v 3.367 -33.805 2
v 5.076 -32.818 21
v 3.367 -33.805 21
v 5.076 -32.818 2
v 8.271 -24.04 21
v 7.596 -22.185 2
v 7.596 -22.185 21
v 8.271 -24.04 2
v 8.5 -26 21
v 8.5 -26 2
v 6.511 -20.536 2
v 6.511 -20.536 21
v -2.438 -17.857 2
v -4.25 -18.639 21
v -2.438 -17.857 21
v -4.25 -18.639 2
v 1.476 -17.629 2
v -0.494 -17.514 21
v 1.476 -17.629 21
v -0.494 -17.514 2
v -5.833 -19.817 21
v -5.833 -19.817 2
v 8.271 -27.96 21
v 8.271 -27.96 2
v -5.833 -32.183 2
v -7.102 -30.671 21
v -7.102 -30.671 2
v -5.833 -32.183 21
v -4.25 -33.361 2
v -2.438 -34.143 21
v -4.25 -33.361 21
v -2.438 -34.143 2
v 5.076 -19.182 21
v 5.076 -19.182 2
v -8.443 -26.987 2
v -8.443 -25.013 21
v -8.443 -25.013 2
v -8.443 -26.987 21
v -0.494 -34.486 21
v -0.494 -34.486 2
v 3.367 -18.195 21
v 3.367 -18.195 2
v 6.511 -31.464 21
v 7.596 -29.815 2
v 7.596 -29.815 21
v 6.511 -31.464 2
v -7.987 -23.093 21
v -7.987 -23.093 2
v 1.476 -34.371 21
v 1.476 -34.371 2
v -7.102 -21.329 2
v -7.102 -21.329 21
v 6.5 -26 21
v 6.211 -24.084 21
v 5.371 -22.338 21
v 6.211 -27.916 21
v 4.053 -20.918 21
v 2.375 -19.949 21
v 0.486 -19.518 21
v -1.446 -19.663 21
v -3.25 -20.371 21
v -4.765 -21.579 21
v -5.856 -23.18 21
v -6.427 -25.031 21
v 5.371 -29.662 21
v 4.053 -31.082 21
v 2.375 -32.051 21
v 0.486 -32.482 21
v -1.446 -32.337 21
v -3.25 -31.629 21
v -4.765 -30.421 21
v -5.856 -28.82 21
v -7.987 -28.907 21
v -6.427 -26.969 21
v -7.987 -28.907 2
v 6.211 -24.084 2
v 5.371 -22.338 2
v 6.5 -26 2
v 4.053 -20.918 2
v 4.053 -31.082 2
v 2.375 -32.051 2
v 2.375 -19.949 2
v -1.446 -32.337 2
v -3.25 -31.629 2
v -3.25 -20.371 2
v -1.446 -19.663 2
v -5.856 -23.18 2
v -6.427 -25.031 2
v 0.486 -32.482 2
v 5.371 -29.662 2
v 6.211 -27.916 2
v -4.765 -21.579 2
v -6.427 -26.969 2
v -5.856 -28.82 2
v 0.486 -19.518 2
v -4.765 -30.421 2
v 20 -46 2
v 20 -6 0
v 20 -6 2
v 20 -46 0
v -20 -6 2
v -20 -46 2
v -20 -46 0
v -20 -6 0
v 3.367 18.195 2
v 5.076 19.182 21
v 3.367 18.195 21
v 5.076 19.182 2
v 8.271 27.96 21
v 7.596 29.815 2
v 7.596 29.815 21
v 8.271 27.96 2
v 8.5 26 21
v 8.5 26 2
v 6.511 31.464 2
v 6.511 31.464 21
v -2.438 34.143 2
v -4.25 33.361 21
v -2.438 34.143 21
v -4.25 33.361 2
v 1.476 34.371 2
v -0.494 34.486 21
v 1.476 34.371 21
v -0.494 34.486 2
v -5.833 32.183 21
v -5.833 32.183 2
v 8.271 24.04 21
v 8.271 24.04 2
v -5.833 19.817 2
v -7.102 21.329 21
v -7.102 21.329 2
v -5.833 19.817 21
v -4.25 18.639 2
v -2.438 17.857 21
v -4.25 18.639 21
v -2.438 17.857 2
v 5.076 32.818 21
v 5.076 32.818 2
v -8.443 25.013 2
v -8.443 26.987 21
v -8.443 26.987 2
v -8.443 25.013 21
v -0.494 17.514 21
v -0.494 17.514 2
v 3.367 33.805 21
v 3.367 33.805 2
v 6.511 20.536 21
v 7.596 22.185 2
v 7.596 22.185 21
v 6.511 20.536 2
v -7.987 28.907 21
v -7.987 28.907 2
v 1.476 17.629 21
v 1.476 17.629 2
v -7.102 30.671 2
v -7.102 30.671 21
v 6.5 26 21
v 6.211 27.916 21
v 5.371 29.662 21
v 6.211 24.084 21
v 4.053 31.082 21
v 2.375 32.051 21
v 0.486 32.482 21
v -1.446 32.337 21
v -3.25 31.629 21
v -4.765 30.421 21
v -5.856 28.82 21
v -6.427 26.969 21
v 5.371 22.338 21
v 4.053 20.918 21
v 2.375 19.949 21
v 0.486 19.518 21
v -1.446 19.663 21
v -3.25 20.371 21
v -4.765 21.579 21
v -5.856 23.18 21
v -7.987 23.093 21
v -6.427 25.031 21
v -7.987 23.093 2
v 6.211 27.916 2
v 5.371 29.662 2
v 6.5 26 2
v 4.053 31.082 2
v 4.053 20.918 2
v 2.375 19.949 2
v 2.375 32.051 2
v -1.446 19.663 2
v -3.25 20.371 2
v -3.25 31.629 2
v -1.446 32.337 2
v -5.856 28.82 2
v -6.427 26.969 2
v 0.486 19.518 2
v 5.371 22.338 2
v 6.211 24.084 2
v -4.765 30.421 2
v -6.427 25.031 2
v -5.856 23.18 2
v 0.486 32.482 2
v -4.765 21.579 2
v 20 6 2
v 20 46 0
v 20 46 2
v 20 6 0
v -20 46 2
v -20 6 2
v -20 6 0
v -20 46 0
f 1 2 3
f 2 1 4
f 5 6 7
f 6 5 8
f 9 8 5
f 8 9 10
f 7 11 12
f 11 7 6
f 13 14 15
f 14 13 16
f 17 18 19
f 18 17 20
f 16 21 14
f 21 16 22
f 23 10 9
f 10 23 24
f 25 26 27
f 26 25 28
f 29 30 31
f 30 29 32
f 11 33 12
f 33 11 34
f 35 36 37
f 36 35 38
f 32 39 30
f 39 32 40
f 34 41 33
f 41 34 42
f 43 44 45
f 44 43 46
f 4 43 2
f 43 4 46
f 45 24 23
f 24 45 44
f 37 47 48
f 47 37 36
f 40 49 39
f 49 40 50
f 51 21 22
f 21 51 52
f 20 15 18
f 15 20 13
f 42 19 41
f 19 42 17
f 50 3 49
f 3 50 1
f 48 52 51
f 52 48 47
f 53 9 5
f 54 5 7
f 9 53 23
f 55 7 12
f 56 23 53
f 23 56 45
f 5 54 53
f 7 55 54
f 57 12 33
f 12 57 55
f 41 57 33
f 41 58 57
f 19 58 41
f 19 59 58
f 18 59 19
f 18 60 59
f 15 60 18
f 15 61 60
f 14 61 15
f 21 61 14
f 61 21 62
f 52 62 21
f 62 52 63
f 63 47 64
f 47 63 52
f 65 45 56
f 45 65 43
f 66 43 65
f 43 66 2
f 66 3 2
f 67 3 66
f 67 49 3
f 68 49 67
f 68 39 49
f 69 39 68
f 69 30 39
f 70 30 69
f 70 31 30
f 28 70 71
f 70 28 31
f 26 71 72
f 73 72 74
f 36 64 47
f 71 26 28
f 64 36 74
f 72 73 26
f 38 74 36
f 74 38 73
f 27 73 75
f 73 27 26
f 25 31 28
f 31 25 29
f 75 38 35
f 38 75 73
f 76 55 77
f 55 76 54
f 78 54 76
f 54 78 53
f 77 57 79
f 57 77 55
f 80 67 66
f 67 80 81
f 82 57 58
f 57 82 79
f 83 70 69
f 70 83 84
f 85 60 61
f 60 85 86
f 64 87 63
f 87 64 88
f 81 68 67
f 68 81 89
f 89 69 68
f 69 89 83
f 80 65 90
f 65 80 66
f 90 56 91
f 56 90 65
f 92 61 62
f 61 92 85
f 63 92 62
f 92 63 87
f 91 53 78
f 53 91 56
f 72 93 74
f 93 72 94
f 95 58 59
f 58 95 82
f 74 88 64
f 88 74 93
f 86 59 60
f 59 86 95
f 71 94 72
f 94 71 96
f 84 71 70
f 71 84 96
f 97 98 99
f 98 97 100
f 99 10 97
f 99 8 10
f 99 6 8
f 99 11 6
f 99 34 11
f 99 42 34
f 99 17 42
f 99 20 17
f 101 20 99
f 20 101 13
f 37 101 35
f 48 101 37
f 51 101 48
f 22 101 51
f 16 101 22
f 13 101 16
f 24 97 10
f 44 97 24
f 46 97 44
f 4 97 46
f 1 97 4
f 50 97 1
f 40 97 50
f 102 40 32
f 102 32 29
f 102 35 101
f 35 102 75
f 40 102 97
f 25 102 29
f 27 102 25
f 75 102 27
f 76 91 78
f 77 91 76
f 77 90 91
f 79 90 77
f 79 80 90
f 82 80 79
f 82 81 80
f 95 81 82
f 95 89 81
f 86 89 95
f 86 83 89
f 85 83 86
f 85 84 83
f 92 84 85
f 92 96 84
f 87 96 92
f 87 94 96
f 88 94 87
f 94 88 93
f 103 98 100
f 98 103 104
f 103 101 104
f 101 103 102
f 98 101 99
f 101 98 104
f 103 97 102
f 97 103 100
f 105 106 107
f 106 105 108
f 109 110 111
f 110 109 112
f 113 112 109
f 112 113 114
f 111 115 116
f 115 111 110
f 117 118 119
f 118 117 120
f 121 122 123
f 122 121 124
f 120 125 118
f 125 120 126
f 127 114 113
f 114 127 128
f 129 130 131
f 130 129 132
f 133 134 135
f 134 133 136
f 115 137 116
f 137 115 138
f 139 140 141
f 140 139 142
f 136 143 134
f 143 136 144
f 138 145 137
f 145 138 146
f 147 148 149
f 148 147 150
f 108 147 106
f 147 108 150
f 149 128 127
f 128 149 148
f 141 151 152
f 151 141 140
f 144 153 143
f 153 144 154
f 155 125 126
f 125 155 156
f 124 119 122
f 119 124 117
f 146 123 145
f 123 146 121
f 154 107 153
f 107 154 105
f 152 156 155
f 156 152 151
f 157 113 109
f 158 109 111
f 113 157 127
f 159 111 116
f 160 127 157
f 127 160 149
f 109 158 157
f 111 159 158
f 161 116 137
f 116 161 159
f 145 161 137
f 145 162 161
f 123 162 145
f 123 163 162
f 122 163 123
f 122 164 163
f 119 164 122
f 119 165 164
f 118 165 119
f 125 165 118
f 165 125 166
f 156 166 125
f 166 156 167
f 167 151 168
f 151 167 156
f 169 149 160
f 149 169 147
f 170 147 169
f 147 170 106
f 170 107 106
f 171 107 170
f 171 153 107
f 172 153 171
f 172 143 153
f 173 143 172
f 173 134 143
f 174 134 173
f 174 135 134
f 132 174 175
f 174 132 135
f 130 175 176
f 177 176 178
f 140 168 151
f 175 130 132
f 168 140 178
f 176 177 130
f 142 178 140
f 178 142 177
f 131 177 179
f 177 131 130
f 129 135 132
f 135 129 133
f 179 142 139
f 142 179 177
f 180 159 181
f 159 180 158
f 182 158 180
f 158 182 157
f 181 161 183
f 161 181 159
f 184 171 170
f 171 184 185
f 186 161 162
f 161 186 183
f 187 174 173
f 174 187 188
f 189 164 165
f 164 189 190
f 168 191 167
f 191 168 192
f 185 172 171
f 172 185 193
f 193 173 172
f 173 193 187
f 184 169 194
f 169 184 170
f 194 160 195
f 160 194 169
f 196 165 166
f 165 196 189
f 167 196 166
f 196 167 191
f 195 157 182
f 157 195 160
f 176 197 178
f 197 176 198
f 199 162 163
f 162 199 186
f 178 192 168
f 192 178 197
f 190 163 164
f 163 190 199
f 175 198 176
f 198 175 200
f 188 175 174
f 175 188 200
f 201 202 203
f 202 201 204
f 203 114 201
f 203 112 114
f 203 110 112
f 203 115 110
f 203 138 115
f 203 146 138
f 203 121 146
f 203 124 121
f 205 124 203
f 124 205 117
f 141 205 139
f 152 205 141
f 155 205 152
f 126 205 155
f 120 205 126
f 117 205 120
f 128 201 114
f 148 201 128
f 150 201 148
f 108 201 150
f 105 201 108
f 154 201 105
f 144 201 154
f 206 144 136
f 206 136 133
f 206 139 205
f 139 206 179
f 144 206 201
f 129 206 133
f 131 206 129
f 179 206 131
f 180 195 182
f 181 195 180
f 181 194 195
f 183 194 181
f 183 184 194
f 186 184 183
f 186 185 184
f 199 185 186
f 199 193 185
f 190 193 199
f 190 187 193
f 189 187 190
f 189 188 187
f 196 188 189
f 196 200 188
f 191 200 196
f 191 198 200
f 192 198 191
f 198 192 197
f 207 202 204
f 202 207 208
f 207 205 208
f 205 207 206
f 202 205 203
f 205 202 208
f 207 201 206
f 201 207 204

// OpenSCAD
pad = 0.5;
wall = 2;
base_sz_x = 40;
base_sz_y = 40;
base_sz_z = wall;

dist_y = 12;

pole_d = 12;
pole_sz_z = 270;

pole_socket_int_d = pole_d + 2*pad;
pole_socket_ext_d = pole_d + 2*pad + 2*wall;
pole_socket_sz_z = 20;

clip_sz_z = 10;
clip_wall = 3;
clip_ear_sz_x = wall;
clip_ear_sz_y = 10+wall;
clip_gap_sz_x = 3;

clip_pole_d = 6;
clip_pole_sz = 20;

rpi_plate_sz_x = 80;
rpi_plate_sz_y = 89;
rpi_plate_sz_z = wall;
hole_dist_x = 68;
hole_dist_y = 79;

rpi_plate_cut_sz_x = 40;
rpi_plate_cut_sz_y = 40;
rpi_plate_cut_sz_z = wall;

rpi_pole_d = 6;
rpi_pole_sz_y = 200;

module pole() {
	translate([0, 0, base_sz_z/2]) {
//		cube([base_sz_x, base_sz_y, base_sz_z], center=true);
	}
	translate([0, 0, (pole_sz_z+base_sz_z)/2]) {
		cylinder(d=pole_d, h=pole_sz_z, center=true);
	}
}

module pole_socket() {
	translate([0, 0, base_sz_z/2]) {
		cube([base_sz_x, base_sz_y, base_sz_z], center=true);
	}
	translate([0, 0, (pole_socket_sz_z+base_sz_z)/2]) {
		difference() {
			cylinder(d=pole_socket_ext_d, h=pole_socket_sz_z, center=true);
			cylinder(d=pole_socket_int_d, h=pole_socket_sz_z, center=true);
		}
	}
}


module clip() {
	difference() {
		union() {
			cylinder(d=pole_d+pad*2+clip_wall*2, h=clip_sz_z, center=true);
			for(sgn=[-1,1]) {
				translate([sgn*clip_gap_sz_x/2, (pole_d+pad*2)/2, 0]) {
					cube([clip_ear_sz_x, clip_ear_sz_y, clip_sz_z], center=true);
				}
			}
			translate([0, clip_pole_sz/2, 0]) {
				rotate([90, 0, 0]) {
					cylinder(d=pole_d, h=clip_pole_sz, center=true);
				}
			}
		}
		cylinder(d=pole_d+pad*2, h=clip_sz_z, center=true);
	}
}

module rpi_plate() {
	difference() {
		union() {
			cube([rpi_plate_sz_x, rpi_plate_sz_y, rpi_plate_sz_z], center=true);
			rotate([90, 0, 0]) {
				cylinder(d=rpi_pole_d, h=rpi_pole_sz_y, center=true);
			}
		}
		cube([rpi_plate_cut_sz_x, rpi_plate_cut_sz_y, rpi_plate_cut_sz_z], center=true);
		translate([0, 0, (rpi_plate_sz_z+rpi_pole_d)/2]) {
			cube([rpi_plate_sz_x, rpi_plate_sz_y, rpi_pole_d], center=true);
		}
		for(pos=[
					[10, 10],
					[50, 10],
					[50, 50],
					[10, 50]
				]) {
			translate([pos[0], pos[1], 10]) {
				cylinder(d=3.2, h=20, center=true);
			}
		}
	}
}

for(sgn=[-1, 1]) {
	translate([0, sgn*(dist_y+base_sz_y)/2, 0]) {
		pole_socket();
//		pole();
		translate([0, 0, 20]) {
			rotate([0, 0, (sgn == 1)*180]) {
//				clip();
			}
		}
	}
}

translate([0, 0, 30]) {
//	rpi_plate();
}
